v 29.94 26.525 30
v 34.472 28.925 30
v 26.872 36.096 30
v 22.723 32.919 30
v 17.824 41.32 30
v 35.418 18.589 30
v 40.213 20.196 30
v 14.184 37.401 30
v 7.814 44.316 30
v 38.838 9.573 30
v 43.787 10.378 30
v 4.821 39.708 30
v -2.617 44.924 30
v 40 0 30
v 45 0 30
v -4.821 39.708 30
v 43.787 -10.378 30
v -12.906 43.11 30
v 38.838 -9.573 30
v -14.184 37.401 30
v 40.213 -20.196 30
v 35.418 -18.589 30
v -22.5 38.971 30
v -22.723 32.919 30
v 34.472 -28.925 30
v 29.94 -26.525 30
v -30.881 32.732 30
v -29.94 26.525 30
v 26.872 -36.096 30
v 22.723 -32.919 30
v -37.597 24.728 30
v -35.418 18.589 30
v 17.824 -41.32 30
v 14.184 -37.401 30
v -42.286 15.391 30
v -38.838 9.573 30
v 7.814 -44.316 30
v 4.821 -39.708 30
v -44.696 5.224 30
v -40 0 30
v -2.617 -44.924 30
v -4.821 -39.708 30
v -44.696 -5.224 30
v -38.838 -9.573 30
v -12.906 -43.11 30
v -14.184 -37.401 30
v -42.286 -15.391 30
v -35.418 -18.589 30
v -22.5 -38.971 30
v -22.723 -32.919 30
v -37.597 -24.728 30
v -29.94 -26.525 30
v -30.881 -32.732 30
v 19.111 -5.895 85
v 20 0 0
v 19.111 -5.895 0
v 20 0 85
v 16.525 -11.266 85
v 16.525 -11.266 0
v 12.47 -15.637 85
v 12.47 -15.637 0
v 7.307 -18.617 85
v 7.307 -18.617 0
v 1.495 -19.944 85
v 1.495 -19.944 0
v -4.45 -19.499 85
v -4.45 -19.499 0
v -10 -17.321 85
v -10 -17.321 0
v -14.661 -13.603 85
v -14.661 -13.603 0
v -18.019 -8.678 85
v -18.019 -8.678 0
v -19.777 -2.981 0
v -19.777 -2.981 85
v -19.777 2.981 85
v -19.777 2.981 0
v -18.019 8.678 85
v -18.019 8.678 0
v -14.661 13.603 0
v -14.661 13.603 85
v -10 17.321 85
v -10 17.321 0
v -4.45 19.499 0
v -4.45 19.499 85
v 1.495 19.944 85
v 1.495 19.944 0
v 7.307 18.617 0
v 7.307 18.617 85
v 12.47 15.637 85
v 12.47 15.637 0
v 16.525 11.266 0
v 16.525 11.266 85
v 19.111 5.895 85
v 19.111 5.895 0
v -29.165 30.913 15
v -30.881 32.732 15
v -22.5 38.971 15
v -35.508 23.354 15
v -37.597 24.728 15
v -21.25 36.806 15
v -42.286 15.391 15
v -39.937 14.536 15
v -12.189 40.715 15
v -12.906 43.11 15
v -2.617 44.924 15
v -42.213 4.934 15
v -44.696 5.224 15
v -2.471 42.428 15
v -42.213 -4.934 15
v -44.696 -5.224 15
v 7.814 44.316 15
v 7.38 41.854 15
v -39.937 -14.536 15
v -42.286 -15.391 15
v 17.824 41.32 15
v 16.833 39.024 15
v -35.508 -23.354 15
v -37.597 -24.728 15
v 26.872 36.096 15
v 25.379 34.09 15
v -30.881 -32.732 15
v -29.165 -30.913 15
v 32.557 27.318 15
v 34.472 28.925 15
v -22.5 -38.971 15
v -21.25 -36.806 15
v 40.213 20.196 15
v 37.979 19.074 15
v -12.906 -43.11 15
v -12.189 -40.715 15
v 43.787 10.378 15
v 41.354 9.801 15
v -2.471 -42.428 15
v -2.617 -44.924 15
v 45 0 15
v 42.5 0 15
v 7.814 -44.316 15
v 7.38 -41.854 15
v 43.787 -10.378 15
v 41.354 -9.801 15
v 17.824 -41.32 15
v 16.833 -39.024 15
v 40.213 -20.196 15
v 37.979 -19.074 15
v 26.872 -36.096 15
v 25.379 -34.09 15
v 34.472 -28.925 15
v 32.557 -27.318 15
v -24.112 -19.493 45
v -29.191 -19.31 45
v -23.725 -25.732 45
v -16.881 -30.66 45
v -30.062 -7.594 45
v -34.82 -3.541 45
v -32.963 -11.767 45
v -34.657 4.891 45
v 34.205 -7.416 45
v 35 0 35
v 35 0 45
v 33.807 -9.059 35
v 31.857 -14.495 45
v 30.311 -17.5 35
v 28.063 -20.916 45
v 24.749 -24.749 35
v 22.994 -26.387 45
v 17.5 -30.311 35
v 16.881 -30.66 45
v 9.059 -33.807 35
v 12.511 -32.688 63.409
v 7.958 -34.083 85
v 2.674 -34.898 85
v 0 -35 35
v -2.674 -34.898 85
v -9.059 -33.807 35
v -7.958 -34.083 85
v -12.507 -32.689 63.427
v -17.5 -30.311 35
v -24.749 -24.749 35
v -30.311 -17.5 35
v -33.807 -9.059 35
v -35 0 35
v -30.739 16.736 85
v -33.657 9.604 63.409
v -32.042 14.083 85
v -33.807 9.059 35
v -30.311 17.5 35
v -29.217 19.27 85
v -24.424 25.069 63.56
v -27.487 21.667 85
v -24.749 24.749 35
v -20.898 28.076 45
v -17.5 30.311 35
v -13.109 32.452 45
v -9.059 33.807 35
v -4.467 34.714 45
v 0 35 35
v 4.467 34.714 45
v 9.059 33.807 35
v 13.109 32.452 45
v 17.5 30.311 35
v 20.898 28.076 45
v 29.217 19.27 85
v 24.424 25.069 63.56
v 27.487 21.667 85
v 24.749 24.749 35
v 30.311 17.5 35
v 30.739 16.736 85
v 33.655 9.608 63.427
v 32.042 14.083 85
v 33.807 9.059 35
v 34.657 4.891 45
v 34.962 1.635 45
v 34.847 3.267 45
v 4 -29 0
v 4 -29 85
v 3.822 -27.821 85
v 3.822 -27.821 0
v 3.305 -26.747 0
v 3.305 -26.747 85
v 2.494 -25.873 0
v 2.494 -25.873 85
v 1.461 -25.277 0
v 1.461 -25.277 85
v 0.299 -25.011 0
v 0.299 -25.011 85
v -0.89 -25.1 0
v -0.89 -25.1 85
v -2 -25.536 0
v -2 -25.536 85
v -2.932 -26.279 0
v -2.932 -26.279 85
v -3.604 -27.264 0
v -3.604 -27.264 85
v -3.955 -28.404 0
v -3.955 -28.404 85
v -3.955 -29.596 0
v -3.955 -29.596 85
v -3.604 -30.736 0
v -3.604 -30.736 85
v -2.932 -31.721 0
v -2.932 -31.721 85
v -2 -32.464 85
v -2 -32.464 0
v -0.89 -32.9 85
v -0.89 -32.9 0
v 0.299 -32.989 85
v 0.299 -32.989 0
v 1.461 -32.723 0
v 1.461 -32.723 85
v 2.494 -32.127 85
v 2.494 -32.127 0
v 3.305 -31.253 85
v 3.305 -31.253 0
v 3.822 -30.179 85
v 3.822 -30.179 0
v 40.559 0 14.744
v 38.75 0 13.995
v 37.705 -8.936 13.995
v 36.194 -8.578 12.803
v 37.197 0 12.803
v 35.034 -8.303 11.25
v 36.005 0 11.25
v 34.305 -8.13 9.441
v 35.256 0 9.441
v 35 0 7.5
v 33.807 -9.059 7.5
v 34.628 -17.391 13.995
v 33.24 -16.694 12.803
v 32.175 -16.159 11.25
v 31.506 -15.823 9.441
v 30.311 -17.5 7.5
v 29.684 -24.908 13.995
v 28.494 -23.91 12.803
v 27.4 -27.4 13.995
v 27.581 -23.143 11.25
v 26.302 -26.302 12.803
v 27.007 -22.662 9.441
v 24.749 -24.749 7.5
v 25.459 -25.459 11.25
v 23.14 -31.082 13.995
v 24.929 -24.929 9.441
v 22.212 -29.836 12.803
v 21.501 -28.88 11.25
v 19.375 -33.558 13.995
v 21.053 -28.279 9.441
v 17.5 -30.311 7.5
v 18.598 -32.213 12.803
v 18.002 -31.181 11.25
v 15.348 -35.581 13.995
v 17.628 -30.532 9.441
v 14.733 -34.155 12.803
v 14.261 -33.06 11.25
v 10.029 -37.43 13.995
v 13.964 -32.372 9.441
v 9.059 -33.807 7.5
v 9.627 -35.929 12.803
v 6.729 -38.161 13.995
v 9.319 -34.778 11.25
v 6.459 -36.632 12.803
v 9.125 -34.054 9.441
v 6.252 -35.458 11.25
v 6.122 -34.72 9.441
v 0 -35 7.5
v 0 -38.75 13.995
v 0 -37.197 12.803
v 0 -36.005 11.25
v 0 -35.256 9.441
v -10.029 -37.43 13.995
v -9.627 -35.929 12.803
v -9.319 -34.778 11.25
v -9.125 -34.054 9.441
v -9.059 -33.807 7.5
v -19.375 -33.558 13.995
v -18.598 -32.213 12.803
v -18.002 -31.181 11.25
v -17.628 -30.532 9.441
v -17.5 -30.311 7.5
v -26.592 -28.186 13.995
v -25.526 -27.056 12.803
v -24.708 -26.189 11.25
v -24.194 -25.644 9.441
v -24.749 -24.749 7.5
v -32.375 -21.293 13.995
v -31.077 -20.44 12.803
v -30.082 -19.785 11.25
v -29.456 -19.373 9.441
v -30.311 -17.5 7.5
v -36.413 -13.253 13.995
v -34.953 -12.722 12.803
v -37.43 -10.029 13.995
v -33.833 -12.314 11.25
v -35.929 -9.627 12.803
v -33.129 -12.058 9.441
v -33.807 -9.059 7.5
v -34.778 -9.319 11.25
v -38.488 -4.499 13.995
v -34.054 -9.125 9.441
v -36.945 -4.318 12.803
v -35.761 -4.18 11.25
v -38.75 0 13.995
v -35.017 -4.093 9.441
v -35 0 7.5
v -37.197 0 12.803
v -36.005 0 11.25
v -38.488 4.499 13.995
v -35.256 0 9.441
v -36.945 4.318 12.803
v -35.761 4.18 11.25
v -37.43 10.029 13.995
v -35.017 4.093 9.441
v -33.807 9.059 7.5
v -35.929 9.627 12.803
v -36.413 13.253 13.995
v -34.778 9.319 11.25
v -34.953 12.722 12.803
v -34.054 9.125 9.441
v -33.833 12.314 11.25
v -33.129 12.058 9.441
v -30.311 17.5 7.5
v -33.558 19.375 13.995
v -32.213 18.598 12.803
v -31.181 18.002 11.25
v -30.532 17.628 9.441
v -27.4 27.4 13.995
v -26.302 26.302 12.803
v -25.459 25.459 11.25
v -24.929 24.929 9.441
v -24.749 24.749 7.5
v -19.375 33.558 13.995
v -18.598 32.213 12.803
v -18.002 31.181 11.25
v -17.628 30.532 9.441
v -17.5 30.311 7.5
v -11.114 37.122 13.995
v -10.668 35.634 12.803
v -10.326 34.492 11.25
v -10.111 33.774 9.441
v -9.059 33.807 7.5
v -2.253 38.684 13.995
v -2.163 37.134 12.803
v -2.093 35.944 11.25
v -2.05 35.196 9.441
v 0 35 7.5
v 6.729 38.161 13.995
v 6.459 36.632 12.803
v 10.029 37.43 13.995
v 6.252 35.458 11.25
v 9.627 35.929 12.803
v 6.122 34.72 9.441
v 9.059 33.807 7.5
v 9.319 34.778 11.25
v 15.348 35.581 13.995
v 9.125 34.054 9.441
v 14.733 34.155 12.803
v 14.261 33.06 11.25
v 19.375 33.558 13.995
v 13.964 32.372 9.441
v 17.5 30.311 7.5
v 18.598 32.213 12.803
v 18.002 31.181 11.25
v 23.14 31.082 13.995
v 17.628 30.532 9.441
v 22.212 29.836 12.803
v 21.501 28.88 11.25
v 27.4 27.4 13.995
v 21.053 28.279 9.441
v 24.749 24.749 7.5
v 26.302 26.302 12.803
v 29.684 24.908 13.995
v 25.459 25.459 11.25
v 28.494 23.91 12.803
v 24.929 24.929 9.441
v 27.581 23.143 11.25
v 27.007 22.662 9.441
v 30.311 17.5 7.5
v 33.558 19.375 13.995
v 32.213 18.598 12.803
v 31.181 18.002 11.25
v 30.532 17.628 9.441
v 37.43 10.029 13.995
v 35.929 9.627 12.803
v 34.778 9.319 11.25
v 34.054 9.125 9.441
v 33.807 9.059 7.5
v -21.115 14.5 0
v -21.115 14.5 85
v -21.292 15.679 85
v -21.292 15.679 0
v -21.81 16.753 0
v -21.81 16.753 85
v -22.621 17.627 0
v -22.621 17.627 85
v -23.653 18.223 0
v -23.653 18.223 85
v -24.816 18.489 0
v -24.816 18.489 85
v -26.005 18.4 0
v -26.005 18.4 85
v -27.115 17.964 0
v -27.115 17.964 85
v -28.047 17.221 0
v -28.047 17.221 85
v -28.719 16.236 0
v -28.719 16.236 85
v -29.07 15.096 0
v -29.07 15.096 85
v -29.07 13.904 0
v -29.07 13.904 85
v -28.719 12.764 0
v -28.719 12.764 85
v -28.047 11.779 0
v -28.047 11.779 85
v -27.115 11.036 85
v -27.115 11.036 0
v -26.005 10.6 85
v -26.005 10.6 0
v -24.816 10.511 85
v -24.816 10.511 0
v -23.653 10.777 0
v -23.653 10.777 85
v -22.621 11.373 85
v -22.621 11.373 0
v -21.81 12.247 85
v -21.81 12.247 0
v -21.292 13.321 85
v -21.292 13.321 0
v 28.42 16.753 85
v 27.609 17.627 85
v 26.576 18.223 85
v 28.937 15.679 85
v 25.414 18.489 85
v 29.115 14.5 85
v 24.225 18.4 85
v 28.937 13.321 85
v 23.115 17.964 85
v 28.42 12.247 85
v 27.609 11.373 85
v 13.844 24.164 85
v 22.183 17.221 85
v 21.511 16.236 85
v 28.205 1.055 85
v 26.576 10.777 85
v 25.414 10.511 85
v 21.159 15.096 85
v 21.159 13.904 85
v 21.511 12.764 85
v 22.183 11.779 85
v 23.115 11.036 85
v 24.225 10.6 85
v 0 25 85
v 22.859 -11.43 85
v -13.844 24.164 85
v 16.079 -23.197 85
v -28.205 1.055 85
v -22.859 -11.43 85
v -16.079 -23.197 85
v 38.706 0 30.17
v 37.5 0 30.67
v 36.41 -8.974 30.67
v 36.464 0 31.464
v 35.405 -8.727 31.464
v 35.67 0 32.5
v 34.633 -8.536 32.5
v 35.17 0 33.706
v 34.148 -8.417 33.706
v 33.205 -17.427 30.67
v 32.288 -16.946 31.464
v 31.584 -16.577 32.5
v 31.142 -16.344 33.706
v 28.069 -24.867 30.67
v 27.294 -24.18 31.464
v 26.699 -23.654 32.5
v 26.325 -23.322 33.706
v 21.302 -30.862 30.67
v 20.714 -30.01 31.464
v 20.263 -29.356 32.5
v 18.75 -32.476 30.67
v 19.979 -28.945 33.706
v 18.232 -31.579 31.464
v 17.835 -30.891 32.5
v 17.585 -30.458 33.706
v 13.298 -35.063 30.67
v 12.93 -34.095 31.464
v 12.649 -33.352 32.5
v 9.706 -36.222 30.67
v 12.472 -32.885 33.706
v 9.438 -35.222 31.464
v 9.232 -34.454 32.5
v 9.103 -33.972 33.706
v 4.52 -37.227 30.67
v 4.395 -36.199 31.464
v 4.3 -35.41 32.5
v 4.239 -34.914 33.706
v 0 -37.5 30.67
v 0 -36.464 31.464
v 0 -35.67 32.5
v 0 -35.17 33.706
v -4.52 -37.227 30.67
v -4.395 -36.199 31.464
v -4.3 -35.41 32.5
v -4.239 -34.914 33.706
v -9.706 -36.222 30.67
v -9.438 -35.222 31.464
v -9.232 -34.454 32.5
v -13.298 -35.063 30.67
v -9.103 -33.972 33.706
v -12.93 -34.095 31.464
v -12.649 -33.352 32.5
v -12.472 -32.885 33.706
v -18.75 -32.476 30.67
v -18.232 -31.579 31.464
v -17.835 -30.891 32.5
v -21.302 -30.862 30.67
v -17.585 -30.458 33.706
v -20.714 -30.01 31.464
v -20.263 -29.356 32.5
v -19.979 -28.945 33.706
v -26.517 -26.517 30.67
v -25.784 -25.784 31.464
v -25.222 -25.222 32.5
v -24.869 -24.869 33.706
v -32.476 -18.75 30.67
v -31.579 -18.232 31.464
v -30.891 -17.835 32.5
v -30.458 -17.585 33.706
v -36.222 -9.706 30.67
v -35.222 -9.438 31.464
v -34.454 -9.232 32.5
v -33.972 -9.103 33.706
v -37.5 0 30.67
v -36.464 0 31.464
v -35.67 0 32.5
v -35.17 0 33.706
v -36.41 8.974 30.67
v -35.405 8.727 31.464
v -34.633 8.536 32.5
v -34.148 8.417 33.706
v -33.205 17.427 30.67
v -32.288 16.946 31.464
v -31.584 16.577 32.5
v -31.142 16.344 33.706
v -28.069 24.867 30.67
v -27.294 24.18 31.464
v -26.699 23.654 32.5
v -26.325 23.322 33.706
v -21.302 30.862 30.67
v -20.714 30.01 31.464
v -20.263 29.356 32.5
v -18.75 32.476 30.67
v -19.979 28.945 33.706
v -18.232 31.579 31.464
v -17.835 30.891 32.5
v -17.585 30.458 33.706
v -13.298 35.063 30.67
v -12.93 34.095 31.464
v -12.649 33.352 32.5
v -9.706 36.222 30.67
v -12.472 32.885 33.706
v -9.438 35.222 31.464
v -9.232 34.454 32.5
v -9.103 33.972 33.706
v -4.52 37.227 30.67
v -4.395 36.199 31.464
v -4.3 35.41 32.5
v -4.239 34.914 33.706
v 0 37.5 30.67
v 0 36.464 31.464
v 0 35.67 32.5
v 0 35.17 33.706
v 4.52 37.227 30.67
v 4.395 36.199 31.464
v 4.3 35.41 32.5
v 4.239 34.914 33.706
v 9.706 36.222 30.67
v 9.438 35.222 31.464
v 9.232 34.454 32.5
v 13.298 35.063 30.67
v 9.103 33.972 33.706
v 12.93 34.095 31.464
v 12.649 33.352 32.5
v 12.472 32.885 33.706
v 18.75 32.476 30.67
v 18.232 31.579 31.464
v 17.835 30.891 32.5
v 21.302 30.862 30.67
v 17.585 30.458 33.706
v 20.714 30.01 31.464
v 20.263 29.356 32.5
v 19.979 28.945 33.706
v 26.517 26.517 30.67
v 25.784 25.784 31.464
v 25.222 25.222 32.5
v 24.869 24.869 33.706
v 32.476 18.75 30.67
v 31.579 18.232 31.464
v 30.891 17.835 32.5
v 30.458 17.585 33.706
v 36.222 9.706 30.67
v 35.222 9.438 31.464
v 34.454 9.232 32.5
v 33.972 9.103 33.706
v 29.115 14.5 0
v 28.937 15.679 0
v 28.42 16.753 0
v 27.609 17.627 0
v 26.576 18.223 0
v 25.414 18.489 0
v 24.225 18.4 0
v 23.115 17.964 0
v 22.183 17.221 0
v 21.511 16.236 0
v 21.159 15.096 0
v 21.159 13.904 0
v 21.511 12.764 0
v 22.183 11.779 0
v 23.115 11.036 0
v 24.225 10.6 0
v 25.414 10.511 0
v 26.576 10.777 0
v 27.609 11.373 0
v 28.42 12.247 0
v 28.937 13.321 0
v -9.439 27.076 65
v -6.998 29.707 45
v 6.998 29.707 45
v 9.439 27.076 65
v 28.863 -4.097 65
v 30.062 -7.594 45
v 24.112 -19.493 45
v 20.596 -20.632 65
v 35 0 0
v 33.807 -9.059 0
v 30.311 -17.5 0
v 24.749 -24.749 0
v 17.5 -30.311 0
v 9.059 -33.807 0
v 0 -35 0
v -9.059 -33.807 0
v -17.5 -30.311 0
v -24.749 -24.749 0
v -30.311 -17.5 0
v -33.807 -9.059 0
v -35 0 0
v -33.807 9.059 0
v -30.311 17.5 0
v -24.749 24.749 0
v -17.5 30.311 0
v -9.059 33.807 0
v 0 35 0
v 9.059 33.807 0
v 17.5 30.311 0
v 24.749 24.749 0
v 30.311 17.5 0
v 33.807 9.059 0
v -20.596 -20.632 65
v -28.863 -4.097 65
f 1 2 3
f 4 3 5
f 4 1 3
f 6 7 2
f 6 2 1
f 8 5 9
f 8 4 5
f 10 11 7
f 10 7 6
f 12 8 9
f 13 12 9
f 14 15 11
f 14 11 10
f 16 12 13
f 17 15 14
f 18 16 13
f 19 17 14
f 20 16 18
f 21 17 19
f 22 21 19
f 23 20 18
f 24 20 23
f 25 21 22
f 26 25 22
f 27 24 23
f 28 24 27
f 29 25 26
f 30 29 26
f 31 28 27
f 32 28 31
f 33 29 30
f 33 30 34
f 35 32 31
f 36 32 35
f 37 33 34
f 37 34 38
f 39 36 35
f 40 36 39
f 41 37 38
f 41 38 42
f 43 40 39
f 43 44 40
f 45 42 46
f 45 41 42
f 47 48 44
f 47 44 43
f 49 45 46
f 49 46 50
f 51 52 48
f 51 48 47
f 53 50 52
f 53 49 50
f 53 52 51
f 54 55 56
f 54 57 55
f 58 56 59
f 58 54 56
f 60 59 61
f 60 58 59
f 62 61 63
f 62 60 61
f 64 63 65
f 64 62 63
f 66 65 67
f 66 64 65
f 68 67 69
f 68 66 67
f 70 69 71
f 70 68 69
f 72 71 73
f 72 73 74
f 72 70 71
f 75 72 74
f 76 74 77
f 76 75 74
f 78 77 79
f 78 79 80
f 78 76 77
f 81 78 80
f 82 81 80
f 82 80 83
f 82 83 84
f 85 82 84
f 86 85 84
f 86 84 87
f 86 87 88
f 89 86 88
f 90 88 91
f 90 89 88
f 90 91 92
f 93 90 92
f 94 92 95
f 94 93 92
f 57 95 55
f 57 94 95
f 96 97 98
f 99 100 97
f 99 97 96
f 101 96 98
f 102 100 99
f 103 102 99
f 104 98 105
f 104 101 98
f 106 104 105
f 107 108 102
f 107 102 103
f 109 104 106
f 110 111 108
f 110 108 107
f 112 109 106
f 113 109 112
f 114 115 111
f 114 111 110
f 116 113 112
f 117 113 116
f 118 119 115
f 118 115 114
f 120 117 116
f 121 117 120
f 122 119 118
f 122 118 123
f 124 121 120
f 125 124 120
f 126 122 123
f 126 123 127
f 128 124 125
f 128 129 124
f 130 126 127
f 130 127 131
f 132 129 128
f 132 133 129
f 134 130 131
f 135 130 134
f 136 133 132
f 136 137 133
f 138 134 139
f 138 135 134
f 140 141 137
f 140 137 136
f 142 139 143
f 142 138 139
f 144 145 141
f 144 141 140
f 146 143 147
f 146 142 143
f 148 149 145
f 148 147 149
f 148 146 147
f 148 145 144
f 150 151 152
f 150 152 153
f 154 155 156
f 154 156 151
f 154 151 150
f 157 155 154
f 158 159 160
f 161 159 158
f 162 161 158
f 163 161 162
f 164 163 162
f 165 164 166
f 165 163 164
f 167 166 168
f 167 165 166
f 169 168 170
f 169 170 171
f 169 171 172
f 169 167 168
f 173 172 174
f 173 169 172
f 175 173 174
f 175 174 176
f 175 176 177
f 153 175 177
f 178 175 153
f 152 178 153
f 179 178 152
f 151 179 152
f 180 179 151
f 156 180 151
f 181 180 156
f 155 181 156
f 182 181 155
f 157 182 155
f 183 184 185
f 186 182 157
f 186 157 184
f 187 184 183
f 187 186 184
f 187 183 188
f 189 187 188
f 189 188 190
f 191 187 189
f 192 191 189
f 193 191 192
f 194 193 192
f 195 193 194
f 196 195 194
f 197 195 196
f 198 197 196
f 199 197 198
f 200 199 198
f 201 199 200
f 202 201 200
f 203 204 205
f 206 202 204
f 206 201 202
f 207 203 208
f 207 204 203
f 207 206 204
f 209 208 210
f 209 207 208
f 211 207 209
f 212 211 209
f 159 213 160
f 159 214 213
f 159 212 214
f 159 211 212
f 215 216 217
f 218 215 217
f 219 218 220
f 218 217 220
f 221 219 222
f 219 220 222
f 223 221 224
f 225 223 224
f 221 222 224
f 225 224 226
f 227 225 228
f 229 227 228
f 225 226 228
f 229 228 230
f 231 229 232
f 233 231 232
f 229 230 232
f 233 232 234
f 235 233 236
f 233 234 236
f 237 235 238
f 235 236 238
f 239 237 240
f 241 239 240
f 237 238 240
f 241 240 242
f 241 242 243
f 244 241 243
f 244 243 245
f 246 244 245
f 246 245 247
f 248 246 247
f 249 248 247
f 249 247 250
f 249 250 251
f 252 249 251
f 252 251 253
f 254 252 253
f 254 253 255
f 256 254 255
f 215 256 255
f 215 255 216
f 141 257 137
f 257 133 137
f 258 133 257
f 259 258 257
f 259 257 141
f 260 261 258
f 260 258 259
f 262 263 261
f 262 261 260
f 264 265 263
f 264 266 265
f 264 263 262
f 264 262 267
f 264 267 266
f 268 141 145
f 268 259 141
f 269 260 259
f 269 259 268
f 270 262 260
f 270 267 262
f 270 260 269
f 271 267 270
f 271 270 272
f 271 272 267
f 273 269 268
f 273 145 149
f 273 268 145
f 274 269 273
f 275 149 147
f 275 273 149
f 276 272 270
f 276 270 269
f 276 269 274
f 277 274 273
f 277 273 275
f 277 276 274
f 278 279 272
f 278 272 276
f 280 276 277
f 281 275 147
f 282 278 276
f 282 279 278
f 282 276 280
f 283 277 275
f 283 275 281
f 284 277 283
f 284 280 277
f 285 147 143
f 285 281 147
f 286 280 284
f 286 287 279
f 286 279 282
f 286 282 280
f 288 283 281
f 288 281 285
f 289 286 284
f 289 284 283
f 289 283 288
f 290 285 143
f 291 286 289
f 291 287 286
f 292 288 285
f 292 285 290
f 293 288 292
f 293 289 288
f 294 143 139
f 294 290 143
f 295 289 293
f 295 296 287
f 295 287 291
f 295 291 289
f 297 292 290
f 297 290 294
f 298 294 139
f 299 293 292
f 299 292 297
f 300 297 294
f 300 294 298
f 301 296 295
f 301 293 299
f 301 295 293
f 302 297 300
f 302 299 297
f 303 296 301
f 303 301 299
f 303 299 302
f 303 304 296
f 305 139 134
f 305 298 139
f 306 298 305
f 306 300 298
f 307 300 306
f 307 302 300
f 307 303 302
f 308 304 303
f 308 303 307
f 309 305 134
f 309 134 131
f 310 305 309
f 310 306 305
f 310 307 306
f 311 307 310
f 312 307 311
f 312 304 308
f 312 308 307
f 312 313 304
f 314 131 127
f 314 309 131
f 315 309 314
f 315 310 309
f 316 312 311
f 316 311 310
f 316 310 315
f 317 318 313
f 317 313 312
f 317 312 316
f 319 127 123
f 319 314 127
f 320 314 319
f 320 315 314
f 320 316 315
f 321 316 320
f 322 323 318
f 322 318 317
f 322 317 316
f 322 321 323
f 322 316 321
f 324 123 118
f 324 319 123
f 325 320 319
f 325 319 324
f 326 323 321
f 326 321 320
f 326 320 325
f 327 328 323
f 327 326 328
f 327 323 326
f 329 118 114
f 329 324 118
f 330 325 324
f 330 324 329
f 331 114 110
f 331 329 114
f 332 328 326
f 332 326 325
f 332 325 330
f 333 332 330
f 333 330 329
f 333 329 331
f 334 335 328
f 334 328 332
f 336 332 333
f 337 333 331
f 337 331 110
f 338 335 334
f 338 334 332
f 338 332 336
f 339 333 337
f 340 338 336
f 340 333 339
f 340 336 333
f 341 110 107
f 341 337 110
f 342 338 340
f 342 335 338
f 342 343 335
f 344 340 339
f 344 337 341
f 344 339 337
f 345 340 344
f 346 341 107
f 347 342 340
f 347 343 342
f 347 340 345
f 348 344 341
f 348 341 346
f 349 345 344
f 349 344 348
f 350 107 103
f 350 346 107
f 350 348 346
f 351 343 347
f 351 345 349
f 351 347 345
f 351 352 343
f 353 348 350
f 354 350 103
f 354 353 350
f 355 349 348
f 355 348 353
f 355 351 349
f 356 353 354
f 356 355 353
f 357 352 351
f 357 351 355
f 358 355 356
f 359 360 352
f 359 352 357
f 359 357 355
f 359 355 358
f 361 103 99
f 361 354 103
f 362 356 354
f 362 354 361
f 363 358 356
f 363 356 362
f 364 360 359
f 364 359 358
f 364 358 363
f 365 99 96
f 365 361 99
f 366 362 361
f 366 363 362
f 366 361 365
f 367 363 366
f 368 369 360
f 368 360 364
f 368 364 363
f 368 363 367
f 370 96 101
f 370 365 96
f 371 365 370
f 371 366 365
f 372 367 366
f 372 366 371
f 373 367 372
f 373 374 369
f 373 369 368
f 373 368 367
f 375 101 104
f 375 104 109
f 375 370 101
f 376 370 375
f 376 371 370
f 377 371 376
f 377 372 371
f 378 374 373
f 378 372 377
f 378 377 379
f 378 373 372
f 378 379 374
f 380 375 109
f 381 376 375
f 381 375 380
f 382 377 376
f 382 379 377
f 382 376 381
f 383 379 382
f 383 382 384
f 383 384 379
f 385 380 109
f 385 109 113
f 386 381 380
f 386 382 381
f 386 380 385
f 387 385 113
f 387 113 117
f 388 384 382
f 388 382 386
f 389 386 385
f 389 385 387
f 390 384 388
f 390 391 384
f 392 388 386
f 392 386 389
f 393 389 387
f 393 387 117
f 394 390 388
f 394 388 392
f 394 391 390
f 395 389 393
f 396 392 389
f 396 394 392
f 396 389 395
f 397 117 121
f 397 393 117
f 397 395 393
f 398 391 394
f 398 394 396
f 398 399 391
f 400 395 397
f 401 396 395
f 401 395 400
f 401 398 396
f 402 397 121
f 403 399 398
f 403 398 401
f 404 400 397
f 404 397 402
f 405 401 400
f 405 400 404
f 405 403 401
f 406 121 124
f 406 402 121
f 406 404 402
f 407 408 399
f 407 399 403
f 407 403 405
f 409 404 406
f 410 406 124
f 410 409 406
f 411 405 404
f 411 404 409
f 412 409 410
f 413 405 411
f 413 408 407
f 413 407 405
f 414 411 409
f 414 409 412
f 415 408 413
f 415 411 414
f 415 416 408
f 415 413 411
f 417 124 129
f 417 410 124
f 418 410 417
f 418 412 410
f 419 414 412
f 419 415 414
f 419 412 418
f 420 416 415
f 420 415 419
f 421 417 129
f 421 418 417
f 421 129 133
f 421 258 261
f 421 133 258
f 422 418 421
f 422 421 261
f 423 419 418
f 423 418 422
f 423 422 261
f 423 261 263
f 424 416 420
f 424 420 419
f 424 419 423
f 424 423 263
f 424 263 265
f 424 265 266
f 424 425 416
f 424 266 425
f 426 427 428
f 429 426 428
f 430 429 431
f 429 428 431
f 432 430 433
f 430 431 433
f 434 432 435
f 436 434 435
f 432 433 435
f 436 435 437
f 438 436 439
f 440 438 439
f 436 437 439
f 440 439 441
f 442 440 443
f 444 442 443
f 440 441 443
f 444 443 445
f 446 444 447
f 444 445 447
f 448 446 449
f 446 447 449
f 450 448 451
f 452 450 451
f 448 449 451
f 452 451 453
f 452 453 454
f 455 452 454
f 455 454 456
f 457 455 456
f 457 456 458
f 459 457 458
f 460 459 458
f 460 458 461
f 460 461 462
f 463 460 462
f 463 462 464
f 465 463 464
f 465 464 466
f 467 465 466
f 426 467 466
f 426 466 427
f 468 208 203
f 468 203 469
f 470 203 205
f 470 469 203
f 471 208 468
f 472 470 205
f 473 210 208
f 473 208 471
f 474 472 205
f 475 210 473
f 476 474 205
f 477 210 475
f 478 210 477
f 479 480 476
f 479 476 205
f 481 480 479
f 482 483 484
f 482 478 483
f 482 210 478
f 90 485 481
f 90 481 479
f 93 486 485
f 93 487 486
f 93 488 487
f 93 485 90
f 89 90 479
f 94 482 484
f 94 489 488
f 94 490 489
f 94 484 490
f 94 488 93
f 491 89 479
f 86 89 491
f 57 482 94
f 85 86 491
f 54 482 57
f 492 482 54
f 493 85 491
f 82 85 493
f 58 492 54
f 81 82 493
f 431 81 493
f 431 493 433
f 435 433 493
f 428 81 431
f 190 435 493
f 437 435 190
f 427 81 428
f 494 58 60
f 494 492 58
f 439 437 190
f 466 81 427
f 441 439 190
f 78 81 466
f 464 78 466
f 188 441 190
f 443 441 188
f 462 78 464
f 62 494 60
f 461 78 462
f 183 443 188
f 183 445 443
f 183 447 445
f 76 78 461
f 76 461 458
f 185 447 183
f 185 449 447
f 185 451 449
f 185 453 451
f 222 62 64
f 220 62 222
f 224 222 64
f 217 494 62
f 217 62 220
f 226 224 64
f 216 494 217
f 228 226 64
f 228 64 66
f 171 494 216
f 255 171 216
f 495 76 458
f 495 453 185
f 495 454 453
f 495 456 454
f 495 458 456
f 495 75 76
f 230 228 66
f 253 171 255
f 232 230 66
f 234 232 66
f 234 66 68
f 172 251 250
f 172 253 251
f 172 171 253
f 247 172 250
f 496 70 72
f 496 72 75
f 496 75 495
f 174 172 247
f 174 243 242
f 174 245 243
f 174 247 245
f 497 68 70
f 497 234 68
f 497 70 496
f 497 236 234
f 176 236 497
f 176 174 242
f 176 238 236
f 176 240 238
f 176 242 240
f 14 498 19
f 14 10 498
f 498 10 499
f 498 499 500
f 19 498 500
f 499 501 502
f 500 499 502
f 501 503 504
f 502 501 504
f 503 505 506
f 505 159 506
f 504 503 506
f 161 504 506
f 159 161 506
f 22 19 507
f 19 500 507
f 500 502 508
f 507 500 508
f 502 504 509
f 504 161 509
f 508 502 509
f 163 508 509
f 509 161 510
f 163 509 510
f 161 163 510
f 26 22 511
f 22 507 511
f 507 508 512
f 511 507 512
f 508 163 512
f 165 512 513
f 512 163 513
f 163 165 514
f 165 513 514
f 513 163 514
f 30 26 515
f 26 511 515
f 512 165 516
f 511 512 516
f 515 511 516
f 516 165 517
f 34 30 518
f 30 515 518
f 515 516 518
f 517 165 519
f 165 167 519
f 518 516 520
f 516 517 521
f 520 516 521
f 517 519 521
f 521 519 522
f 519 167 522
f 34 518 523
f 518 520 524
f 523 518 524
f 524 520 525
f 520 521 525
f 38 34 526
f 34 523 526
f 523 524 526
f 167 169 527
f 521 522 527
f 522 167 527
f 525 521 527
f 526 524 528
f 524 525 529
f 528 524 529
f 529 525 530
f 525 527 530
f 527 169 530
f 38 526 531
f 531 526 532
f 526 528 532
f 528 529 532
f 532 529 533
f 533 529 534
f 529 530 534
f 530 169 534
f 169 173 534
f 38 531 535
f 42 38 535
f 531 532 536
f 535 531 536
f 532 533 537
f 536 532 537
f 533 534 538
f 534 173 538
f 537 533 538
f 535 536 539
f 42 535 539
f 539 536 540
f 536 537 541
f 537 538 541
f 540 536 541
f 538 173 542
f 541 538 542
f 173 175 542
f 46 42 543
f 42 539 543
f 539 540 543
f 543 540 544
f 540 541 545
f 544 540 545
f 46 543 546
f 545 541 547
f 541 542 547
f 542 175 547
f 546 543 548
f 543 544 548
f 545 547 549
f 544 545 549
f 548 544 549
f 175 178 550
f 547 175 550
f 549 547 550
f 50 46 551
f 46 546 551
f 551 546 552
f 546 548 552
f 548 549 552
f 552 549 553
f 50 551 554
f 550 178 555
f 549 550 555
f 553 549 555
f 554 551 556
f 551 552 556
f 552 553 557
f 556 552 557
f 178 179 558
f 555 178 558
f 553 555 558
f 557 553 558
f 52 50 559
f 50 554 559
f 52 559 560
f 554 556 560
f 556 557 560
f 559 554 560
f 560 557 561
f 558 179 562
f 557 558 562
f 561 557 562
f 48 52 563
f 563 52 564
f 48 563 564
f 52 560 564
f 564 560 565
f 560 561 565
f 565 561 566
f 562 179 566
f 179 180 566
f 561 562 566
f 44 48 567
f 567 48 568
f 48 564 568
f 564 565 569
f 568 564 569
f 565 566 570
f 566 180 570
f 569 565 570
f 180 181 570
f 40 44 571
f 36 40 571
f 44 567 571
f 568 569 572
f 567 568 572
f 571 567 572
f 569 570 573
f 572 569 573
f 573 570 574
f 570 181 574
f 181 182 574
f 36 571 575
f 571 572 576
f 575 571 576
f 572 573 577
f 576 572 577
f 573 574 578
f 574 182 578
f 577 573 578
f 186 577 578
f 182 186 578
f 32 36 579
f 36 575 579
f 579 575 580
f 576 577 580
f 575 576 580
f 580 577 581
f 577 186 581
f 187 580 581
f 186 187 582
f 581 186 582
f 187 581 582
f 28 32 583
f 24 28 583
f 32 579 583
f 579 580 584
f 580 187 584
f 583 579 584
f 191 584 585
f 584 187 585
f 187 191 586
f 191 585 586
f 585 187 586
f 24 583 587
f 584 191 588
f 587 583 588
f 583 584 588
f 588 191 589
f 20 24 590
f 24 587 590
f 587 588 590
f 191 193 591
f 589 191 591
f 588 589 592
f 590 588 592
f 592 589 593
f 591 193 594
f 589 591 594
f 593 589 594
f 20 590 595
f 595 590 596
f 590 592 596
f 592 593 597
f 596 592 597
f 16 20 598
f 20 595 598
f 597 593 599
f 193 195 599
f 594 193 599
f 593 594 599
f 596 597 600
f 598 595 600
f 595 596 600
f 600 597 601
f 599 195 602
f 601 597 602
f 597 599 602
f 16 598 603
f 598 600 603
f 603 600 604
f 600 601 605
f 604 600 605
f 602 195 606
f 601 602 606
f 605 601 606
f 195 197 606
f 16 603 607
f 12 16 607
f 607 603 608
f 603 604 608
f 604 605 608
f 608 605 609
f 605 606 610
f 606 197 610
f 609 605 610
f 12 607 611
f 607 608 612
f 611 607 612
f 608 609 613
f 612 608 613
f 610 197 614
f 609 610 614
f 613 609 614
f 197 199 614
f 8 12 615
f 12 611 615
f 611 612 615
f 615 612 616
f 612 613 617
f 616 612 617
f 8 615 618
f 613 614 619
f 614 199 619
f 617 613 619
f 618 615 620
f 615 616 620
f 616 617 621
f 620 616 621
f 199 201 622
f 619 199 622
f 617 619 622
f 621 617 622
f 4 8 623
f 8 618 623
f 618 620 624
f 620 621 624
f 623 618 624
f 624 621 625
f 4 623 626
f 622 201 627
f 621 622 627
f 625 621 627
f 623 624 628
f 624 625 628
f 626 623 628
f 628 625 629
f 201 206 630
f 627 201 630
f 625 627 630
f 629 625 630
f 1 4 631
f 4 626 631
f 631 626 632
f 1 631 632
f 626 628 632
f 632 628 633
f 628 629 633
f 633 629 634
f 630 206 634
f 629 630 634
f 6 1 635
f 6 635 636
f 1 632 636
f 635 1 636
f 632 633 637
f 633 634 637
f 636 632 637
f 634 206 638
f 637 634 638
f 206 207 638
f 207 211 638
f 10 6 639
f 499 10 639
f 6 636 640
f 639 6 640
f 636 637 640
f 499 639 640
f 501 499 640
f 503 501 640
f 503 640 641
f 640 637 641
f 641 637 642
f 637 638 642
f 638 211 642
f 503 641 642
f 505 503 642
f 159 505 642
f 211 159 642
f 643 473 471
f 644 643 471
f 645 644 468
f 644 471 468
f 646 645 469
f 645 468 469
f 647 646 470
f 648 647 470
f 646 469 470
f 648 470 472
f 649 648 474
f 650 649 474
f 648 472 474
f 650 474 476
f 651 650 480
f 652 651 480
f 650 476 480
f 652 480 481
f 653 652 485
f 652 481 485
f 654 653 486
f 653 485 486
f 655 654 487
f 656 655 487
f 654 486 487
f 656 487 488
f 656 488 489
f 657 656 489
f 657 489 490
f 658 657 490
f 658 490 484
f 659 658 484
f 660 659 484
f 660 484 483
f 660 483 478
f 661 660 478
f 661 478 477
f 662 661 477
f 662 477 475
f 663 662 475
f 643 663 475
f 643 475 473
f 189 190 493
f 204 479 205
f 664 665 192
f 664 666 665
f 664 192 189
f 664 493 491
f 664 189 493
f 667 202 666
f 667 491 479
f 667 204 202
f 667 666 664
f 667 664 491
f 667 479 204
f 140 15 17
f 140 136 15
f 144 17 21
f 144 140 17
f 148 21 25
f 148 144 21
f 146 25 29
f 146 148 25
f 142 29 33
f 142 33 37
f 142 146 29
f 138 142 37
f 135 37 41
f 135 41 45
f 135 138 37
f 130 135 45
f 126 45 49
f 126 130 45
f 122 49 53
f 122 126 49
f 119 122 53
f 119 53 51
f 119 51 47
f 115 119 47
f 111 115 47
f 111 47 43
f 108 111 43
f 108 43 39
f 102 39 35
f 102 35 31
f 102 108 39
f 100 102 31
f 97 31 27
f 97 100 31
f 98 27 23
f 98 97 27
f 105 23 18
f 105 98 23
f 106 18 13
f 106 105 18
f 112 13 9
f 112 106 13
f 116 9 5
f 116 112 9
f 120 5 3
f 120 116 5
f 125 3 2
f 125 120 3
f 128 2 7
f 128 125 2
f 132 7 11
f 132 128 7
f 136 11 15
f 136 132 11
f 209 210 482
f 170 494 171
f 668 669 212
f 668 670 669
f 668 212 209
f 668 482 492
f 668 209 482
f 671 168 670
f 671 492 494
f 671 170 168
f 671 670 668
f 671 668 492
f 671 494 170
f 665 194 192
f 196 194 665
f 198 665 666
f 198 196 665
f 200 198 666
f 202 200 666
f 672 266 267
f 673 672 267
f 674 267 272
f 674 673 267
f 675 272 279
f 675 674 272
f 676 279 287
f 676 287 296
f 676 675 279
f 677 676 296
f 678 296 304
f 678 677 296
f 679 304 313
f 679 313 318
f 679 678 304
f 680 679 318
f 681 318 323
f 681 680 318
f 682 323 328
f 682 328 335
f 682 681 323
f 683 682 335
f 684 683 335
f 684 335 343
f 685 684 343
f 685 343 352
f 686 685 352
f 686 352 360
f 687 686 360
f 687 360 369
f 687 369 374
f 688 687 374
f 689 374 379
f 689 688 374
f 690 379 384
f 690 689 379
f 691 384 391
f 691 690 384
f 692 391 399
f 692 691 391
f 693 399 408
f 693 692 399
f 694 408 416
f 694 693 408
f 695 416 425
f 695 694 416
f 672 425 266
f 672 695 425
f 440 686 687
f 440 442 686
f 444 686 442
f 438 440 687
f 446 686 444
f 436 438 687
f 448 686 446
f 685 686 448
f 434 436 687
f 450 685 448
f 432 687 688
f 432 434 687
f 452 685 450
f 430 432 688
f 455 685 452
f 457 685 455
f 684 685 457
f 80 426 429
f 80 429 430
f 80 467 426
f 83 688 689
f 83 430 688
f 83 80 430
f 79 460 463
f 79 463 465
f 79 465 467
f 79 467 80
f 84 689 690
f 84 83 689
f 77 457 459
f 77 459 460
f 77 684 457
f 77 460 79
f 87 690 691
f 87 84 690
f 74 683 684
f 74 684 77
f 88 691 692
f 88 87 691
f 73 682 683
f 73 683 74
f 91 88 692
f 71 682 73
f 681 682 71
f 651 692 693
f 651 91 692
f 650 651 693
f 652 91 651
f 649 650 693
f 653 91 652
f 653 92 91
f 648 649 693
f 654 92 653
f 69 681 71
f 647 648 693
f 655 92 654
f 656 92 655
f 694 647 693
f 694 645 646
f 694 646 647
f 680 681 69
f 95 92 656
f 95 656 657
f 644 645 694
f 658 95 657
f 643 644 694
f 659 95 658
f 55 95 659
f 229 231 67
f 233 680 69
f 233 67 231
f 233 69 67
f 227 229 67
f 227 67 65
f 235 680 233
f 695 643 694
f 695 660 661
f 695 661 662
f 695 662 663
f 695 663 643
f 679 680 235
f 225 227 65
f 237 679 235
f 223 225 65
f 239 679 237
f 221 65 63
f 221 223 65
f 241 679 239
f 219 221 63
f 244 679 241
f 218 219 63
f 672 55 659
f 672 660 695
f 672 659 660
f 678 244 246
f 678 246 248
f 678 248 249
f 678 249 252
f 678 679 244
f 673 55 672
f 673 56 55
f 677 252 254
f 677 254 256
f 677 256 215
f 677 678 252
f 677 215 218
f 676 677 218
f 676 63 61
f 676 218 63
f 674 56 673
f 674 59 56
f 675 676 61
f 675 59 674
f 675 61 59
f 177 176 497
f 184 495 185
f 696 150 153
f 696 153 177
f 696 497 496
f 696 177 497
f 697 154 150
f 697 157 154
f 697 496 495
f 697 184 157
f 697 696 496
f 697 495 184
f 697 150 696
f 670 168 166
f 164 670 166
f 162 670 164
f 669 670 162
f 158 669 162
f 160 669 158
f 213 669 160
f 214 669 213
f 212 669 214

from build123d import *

# Parameters (mm, degrees)
FILLET1_R            = 7.5
FILLET2_R            = 5
CUT_EXTRUDE4_DEPTH   = 40
CUT_EXTRUDE4_DRAFT   = -7
CUT_EXTRUDE4_2_DEPTH = 40
CUT_EXTRUDE4_2_DRAFT = -7
CUT_EXTRUDE4_3_DEPTH = 40
CUT_EXTRUDE4_3_DRAFT = -7
SKETCH4_R            = 4
CUT_EXTRUDE5_DEPTH   = 107.183802908


# Read off the part's stored shape, not the designer's step: Cut-Extrude4
with BuildPart() as part:
    # Sketch1 → Revolve1 (revolve)
    with BuildSketch(Plane(origin=(0, 0, 0), x_dir=(0, 0, -1), z_dir=(1, 0, 0)), mode=Mode.PRIVATE) as revolve1_sk:
        Polygon((0, 20), (-85, 20), (-85, 35), (-30, 35), (-30, 45), (-15, 45), (-15, 35), (0, 35), align=None)
    revolve(revolve1_sk.sketch.rotate(Axis((0, 0, 95.688392975), (0, 0, -1)), 90), axis=Axis((0, 0, 95.688392975), (0, 0, -1)))

    # Fillet1
    fillet1_edges = [part.edges().sort_by_distance(p)[0] for p in [
        (-35, 0, 15),
    ]]
    fillet(fillet1_edges, radius=FILLET1_R)

    # Fillet2
    fillet2_edges = [part.edges().sort_by_distance(p)[0] for p in [
        (-35, 0, 30),
    ]]
    fillet(fillet2_edges, radius=FILLET2_R)


with BuildPart() as cut_extrude4_tool:
    # Cut-Extrude4 outline → Cut-Extrude4 (with draft: the straight prism first)
    with BuildSketch(Plane.XY.offset(45)):
        with BuildLine():
            ThreePointArc((16.880866709, -30.660012054), (31.304951685, -15.652475842), (34.656529669, 4.891313865))
            ThreePointArc((34.656529669, 4.891313865), (27.252000961, -13.626000481), (16.880866709, -30.660012054))
        make_face()
    extrude(amount=CUT_EXTRUDE4_DEPTH)
    # Cut-Extrude4: the draft: its side faces are tilted about the plane it starts from
    cut_extrude4_sides = [cut_extrude4_tool.faces().sort_by_distance(p)[0] for p in [
        (27.252000961, -13.626000481, 65),
        (31.304951685, -15.652475842, 65),
    ]]
    draft(cut_extrude4_sides, Plane.XY.offset(45), CUT_EXTRUDE4_DRAFT)


with BuildPart() as part_1:
    add(part.part)

    # Cut-Extrude4: cut by cut_extrude4_tool
    add(cut_extrude4_tool.part, mode=Mode.SUBTRACT)


with BuildPart() as cut_extrude4_2_tool:
    # Cut-Extrude4 2 outline → Cut-Extrude4 2 (with draft: the straight prism first)
    with BuildSketch(Plane.XY.offset(45)):
        with BuildLine():
            ThreePointArc((-34.656529669, 4.891313865), (-31.304951685, -15.652475842), (-16.880866709, -30.660012054))
            ThreePointArc((-16.880866709, -30.660012054), (-27.252000961, -13.626000481), (-34.656529669, 4.891313865))
        make_face()
    extrude(amount=CUT_EXTRUDE4_2_DEPTH)
    # Cut-Extrude4 2: the draft: its side faces are tilted about the plane it starts from
    cut_extrude4_2_sides = [cut_extrude4_2_tool.faces().sort_by_distance(p)[0] for p in [
        (-31.304951685, -15.652475842, 65),
        (-27.252000961, -13.626000481, 65),
    ]]
    draft(cut_extrude4_2_sides, Plane.XY.offset(45), CUT_EXTRUDE4_2_DRAFT)


with BuildPart() as part_2:
    add(part_1.part)

    # Cut-Extrude4 2: cut by cut_extrude4_2_tool
    add(cut_extrude4_2_tool.part, mode=Mode.SUBTRACT)


with BuildPart() as cut_extrude4_3_tool:
    # Cut-Extrude4 3 outline → Cut-Extrude4 3 (with draft: the straight prism first)
    with BuildSketch(Plane.XY.offset(45)):
        with BuildLine():
            ThreePointArc((20.897837677, 28.076331321), (0, 35), (-20.897837677, 28.076331321))
            ThreePointArc((-20.897837677, 28.076331321), (0, 29.911382436), (20.897837677, 28.076331321))
        make_face()
    extrude(amount=CUT_EXTRUDE4_3_DEPTH)
    # Cut-Extrude4 3: the draft: its side faces are tilted about the plane it starts from
    cut_extrude4_3_sides = [cut_extrude4_3_tool.faces().sort_by_distance(p)[0] for p in [
        (0, 35, 65),
        (0, 29.911382436, 65),
    ]]
    draft(cut_extrude4_3_sides, Plane.XY.offset(45), CUT_EXTRUDE4_3_DRAFT)


with BuildPart() as part_3:
    add(part_2.part)

    # Cut-Extrude4 3: cut by cut_extrude4_3_tool
    add(cut_extrude4_3_tool.part, mode=Mode.SUBTRACT)

    # Sketch4 → Cut-Extrude5 (cut, through all)
    with BuildSketch(Plane.XY.offset(85)):
        with Locations((25.11473671, 14.5)):
            Circle(SKETCH4_R)
        with Locations((-25.11473671, 14.5)):
            Circle(SKETCH4_R)
        with Locations((0, -29)):
            Circle(SKETCH4_R)
    extrude(amount=-CUT_EXTRUDE5_DEPTH, mode=Mode.SUBTRACT)


solid = part_3.part
